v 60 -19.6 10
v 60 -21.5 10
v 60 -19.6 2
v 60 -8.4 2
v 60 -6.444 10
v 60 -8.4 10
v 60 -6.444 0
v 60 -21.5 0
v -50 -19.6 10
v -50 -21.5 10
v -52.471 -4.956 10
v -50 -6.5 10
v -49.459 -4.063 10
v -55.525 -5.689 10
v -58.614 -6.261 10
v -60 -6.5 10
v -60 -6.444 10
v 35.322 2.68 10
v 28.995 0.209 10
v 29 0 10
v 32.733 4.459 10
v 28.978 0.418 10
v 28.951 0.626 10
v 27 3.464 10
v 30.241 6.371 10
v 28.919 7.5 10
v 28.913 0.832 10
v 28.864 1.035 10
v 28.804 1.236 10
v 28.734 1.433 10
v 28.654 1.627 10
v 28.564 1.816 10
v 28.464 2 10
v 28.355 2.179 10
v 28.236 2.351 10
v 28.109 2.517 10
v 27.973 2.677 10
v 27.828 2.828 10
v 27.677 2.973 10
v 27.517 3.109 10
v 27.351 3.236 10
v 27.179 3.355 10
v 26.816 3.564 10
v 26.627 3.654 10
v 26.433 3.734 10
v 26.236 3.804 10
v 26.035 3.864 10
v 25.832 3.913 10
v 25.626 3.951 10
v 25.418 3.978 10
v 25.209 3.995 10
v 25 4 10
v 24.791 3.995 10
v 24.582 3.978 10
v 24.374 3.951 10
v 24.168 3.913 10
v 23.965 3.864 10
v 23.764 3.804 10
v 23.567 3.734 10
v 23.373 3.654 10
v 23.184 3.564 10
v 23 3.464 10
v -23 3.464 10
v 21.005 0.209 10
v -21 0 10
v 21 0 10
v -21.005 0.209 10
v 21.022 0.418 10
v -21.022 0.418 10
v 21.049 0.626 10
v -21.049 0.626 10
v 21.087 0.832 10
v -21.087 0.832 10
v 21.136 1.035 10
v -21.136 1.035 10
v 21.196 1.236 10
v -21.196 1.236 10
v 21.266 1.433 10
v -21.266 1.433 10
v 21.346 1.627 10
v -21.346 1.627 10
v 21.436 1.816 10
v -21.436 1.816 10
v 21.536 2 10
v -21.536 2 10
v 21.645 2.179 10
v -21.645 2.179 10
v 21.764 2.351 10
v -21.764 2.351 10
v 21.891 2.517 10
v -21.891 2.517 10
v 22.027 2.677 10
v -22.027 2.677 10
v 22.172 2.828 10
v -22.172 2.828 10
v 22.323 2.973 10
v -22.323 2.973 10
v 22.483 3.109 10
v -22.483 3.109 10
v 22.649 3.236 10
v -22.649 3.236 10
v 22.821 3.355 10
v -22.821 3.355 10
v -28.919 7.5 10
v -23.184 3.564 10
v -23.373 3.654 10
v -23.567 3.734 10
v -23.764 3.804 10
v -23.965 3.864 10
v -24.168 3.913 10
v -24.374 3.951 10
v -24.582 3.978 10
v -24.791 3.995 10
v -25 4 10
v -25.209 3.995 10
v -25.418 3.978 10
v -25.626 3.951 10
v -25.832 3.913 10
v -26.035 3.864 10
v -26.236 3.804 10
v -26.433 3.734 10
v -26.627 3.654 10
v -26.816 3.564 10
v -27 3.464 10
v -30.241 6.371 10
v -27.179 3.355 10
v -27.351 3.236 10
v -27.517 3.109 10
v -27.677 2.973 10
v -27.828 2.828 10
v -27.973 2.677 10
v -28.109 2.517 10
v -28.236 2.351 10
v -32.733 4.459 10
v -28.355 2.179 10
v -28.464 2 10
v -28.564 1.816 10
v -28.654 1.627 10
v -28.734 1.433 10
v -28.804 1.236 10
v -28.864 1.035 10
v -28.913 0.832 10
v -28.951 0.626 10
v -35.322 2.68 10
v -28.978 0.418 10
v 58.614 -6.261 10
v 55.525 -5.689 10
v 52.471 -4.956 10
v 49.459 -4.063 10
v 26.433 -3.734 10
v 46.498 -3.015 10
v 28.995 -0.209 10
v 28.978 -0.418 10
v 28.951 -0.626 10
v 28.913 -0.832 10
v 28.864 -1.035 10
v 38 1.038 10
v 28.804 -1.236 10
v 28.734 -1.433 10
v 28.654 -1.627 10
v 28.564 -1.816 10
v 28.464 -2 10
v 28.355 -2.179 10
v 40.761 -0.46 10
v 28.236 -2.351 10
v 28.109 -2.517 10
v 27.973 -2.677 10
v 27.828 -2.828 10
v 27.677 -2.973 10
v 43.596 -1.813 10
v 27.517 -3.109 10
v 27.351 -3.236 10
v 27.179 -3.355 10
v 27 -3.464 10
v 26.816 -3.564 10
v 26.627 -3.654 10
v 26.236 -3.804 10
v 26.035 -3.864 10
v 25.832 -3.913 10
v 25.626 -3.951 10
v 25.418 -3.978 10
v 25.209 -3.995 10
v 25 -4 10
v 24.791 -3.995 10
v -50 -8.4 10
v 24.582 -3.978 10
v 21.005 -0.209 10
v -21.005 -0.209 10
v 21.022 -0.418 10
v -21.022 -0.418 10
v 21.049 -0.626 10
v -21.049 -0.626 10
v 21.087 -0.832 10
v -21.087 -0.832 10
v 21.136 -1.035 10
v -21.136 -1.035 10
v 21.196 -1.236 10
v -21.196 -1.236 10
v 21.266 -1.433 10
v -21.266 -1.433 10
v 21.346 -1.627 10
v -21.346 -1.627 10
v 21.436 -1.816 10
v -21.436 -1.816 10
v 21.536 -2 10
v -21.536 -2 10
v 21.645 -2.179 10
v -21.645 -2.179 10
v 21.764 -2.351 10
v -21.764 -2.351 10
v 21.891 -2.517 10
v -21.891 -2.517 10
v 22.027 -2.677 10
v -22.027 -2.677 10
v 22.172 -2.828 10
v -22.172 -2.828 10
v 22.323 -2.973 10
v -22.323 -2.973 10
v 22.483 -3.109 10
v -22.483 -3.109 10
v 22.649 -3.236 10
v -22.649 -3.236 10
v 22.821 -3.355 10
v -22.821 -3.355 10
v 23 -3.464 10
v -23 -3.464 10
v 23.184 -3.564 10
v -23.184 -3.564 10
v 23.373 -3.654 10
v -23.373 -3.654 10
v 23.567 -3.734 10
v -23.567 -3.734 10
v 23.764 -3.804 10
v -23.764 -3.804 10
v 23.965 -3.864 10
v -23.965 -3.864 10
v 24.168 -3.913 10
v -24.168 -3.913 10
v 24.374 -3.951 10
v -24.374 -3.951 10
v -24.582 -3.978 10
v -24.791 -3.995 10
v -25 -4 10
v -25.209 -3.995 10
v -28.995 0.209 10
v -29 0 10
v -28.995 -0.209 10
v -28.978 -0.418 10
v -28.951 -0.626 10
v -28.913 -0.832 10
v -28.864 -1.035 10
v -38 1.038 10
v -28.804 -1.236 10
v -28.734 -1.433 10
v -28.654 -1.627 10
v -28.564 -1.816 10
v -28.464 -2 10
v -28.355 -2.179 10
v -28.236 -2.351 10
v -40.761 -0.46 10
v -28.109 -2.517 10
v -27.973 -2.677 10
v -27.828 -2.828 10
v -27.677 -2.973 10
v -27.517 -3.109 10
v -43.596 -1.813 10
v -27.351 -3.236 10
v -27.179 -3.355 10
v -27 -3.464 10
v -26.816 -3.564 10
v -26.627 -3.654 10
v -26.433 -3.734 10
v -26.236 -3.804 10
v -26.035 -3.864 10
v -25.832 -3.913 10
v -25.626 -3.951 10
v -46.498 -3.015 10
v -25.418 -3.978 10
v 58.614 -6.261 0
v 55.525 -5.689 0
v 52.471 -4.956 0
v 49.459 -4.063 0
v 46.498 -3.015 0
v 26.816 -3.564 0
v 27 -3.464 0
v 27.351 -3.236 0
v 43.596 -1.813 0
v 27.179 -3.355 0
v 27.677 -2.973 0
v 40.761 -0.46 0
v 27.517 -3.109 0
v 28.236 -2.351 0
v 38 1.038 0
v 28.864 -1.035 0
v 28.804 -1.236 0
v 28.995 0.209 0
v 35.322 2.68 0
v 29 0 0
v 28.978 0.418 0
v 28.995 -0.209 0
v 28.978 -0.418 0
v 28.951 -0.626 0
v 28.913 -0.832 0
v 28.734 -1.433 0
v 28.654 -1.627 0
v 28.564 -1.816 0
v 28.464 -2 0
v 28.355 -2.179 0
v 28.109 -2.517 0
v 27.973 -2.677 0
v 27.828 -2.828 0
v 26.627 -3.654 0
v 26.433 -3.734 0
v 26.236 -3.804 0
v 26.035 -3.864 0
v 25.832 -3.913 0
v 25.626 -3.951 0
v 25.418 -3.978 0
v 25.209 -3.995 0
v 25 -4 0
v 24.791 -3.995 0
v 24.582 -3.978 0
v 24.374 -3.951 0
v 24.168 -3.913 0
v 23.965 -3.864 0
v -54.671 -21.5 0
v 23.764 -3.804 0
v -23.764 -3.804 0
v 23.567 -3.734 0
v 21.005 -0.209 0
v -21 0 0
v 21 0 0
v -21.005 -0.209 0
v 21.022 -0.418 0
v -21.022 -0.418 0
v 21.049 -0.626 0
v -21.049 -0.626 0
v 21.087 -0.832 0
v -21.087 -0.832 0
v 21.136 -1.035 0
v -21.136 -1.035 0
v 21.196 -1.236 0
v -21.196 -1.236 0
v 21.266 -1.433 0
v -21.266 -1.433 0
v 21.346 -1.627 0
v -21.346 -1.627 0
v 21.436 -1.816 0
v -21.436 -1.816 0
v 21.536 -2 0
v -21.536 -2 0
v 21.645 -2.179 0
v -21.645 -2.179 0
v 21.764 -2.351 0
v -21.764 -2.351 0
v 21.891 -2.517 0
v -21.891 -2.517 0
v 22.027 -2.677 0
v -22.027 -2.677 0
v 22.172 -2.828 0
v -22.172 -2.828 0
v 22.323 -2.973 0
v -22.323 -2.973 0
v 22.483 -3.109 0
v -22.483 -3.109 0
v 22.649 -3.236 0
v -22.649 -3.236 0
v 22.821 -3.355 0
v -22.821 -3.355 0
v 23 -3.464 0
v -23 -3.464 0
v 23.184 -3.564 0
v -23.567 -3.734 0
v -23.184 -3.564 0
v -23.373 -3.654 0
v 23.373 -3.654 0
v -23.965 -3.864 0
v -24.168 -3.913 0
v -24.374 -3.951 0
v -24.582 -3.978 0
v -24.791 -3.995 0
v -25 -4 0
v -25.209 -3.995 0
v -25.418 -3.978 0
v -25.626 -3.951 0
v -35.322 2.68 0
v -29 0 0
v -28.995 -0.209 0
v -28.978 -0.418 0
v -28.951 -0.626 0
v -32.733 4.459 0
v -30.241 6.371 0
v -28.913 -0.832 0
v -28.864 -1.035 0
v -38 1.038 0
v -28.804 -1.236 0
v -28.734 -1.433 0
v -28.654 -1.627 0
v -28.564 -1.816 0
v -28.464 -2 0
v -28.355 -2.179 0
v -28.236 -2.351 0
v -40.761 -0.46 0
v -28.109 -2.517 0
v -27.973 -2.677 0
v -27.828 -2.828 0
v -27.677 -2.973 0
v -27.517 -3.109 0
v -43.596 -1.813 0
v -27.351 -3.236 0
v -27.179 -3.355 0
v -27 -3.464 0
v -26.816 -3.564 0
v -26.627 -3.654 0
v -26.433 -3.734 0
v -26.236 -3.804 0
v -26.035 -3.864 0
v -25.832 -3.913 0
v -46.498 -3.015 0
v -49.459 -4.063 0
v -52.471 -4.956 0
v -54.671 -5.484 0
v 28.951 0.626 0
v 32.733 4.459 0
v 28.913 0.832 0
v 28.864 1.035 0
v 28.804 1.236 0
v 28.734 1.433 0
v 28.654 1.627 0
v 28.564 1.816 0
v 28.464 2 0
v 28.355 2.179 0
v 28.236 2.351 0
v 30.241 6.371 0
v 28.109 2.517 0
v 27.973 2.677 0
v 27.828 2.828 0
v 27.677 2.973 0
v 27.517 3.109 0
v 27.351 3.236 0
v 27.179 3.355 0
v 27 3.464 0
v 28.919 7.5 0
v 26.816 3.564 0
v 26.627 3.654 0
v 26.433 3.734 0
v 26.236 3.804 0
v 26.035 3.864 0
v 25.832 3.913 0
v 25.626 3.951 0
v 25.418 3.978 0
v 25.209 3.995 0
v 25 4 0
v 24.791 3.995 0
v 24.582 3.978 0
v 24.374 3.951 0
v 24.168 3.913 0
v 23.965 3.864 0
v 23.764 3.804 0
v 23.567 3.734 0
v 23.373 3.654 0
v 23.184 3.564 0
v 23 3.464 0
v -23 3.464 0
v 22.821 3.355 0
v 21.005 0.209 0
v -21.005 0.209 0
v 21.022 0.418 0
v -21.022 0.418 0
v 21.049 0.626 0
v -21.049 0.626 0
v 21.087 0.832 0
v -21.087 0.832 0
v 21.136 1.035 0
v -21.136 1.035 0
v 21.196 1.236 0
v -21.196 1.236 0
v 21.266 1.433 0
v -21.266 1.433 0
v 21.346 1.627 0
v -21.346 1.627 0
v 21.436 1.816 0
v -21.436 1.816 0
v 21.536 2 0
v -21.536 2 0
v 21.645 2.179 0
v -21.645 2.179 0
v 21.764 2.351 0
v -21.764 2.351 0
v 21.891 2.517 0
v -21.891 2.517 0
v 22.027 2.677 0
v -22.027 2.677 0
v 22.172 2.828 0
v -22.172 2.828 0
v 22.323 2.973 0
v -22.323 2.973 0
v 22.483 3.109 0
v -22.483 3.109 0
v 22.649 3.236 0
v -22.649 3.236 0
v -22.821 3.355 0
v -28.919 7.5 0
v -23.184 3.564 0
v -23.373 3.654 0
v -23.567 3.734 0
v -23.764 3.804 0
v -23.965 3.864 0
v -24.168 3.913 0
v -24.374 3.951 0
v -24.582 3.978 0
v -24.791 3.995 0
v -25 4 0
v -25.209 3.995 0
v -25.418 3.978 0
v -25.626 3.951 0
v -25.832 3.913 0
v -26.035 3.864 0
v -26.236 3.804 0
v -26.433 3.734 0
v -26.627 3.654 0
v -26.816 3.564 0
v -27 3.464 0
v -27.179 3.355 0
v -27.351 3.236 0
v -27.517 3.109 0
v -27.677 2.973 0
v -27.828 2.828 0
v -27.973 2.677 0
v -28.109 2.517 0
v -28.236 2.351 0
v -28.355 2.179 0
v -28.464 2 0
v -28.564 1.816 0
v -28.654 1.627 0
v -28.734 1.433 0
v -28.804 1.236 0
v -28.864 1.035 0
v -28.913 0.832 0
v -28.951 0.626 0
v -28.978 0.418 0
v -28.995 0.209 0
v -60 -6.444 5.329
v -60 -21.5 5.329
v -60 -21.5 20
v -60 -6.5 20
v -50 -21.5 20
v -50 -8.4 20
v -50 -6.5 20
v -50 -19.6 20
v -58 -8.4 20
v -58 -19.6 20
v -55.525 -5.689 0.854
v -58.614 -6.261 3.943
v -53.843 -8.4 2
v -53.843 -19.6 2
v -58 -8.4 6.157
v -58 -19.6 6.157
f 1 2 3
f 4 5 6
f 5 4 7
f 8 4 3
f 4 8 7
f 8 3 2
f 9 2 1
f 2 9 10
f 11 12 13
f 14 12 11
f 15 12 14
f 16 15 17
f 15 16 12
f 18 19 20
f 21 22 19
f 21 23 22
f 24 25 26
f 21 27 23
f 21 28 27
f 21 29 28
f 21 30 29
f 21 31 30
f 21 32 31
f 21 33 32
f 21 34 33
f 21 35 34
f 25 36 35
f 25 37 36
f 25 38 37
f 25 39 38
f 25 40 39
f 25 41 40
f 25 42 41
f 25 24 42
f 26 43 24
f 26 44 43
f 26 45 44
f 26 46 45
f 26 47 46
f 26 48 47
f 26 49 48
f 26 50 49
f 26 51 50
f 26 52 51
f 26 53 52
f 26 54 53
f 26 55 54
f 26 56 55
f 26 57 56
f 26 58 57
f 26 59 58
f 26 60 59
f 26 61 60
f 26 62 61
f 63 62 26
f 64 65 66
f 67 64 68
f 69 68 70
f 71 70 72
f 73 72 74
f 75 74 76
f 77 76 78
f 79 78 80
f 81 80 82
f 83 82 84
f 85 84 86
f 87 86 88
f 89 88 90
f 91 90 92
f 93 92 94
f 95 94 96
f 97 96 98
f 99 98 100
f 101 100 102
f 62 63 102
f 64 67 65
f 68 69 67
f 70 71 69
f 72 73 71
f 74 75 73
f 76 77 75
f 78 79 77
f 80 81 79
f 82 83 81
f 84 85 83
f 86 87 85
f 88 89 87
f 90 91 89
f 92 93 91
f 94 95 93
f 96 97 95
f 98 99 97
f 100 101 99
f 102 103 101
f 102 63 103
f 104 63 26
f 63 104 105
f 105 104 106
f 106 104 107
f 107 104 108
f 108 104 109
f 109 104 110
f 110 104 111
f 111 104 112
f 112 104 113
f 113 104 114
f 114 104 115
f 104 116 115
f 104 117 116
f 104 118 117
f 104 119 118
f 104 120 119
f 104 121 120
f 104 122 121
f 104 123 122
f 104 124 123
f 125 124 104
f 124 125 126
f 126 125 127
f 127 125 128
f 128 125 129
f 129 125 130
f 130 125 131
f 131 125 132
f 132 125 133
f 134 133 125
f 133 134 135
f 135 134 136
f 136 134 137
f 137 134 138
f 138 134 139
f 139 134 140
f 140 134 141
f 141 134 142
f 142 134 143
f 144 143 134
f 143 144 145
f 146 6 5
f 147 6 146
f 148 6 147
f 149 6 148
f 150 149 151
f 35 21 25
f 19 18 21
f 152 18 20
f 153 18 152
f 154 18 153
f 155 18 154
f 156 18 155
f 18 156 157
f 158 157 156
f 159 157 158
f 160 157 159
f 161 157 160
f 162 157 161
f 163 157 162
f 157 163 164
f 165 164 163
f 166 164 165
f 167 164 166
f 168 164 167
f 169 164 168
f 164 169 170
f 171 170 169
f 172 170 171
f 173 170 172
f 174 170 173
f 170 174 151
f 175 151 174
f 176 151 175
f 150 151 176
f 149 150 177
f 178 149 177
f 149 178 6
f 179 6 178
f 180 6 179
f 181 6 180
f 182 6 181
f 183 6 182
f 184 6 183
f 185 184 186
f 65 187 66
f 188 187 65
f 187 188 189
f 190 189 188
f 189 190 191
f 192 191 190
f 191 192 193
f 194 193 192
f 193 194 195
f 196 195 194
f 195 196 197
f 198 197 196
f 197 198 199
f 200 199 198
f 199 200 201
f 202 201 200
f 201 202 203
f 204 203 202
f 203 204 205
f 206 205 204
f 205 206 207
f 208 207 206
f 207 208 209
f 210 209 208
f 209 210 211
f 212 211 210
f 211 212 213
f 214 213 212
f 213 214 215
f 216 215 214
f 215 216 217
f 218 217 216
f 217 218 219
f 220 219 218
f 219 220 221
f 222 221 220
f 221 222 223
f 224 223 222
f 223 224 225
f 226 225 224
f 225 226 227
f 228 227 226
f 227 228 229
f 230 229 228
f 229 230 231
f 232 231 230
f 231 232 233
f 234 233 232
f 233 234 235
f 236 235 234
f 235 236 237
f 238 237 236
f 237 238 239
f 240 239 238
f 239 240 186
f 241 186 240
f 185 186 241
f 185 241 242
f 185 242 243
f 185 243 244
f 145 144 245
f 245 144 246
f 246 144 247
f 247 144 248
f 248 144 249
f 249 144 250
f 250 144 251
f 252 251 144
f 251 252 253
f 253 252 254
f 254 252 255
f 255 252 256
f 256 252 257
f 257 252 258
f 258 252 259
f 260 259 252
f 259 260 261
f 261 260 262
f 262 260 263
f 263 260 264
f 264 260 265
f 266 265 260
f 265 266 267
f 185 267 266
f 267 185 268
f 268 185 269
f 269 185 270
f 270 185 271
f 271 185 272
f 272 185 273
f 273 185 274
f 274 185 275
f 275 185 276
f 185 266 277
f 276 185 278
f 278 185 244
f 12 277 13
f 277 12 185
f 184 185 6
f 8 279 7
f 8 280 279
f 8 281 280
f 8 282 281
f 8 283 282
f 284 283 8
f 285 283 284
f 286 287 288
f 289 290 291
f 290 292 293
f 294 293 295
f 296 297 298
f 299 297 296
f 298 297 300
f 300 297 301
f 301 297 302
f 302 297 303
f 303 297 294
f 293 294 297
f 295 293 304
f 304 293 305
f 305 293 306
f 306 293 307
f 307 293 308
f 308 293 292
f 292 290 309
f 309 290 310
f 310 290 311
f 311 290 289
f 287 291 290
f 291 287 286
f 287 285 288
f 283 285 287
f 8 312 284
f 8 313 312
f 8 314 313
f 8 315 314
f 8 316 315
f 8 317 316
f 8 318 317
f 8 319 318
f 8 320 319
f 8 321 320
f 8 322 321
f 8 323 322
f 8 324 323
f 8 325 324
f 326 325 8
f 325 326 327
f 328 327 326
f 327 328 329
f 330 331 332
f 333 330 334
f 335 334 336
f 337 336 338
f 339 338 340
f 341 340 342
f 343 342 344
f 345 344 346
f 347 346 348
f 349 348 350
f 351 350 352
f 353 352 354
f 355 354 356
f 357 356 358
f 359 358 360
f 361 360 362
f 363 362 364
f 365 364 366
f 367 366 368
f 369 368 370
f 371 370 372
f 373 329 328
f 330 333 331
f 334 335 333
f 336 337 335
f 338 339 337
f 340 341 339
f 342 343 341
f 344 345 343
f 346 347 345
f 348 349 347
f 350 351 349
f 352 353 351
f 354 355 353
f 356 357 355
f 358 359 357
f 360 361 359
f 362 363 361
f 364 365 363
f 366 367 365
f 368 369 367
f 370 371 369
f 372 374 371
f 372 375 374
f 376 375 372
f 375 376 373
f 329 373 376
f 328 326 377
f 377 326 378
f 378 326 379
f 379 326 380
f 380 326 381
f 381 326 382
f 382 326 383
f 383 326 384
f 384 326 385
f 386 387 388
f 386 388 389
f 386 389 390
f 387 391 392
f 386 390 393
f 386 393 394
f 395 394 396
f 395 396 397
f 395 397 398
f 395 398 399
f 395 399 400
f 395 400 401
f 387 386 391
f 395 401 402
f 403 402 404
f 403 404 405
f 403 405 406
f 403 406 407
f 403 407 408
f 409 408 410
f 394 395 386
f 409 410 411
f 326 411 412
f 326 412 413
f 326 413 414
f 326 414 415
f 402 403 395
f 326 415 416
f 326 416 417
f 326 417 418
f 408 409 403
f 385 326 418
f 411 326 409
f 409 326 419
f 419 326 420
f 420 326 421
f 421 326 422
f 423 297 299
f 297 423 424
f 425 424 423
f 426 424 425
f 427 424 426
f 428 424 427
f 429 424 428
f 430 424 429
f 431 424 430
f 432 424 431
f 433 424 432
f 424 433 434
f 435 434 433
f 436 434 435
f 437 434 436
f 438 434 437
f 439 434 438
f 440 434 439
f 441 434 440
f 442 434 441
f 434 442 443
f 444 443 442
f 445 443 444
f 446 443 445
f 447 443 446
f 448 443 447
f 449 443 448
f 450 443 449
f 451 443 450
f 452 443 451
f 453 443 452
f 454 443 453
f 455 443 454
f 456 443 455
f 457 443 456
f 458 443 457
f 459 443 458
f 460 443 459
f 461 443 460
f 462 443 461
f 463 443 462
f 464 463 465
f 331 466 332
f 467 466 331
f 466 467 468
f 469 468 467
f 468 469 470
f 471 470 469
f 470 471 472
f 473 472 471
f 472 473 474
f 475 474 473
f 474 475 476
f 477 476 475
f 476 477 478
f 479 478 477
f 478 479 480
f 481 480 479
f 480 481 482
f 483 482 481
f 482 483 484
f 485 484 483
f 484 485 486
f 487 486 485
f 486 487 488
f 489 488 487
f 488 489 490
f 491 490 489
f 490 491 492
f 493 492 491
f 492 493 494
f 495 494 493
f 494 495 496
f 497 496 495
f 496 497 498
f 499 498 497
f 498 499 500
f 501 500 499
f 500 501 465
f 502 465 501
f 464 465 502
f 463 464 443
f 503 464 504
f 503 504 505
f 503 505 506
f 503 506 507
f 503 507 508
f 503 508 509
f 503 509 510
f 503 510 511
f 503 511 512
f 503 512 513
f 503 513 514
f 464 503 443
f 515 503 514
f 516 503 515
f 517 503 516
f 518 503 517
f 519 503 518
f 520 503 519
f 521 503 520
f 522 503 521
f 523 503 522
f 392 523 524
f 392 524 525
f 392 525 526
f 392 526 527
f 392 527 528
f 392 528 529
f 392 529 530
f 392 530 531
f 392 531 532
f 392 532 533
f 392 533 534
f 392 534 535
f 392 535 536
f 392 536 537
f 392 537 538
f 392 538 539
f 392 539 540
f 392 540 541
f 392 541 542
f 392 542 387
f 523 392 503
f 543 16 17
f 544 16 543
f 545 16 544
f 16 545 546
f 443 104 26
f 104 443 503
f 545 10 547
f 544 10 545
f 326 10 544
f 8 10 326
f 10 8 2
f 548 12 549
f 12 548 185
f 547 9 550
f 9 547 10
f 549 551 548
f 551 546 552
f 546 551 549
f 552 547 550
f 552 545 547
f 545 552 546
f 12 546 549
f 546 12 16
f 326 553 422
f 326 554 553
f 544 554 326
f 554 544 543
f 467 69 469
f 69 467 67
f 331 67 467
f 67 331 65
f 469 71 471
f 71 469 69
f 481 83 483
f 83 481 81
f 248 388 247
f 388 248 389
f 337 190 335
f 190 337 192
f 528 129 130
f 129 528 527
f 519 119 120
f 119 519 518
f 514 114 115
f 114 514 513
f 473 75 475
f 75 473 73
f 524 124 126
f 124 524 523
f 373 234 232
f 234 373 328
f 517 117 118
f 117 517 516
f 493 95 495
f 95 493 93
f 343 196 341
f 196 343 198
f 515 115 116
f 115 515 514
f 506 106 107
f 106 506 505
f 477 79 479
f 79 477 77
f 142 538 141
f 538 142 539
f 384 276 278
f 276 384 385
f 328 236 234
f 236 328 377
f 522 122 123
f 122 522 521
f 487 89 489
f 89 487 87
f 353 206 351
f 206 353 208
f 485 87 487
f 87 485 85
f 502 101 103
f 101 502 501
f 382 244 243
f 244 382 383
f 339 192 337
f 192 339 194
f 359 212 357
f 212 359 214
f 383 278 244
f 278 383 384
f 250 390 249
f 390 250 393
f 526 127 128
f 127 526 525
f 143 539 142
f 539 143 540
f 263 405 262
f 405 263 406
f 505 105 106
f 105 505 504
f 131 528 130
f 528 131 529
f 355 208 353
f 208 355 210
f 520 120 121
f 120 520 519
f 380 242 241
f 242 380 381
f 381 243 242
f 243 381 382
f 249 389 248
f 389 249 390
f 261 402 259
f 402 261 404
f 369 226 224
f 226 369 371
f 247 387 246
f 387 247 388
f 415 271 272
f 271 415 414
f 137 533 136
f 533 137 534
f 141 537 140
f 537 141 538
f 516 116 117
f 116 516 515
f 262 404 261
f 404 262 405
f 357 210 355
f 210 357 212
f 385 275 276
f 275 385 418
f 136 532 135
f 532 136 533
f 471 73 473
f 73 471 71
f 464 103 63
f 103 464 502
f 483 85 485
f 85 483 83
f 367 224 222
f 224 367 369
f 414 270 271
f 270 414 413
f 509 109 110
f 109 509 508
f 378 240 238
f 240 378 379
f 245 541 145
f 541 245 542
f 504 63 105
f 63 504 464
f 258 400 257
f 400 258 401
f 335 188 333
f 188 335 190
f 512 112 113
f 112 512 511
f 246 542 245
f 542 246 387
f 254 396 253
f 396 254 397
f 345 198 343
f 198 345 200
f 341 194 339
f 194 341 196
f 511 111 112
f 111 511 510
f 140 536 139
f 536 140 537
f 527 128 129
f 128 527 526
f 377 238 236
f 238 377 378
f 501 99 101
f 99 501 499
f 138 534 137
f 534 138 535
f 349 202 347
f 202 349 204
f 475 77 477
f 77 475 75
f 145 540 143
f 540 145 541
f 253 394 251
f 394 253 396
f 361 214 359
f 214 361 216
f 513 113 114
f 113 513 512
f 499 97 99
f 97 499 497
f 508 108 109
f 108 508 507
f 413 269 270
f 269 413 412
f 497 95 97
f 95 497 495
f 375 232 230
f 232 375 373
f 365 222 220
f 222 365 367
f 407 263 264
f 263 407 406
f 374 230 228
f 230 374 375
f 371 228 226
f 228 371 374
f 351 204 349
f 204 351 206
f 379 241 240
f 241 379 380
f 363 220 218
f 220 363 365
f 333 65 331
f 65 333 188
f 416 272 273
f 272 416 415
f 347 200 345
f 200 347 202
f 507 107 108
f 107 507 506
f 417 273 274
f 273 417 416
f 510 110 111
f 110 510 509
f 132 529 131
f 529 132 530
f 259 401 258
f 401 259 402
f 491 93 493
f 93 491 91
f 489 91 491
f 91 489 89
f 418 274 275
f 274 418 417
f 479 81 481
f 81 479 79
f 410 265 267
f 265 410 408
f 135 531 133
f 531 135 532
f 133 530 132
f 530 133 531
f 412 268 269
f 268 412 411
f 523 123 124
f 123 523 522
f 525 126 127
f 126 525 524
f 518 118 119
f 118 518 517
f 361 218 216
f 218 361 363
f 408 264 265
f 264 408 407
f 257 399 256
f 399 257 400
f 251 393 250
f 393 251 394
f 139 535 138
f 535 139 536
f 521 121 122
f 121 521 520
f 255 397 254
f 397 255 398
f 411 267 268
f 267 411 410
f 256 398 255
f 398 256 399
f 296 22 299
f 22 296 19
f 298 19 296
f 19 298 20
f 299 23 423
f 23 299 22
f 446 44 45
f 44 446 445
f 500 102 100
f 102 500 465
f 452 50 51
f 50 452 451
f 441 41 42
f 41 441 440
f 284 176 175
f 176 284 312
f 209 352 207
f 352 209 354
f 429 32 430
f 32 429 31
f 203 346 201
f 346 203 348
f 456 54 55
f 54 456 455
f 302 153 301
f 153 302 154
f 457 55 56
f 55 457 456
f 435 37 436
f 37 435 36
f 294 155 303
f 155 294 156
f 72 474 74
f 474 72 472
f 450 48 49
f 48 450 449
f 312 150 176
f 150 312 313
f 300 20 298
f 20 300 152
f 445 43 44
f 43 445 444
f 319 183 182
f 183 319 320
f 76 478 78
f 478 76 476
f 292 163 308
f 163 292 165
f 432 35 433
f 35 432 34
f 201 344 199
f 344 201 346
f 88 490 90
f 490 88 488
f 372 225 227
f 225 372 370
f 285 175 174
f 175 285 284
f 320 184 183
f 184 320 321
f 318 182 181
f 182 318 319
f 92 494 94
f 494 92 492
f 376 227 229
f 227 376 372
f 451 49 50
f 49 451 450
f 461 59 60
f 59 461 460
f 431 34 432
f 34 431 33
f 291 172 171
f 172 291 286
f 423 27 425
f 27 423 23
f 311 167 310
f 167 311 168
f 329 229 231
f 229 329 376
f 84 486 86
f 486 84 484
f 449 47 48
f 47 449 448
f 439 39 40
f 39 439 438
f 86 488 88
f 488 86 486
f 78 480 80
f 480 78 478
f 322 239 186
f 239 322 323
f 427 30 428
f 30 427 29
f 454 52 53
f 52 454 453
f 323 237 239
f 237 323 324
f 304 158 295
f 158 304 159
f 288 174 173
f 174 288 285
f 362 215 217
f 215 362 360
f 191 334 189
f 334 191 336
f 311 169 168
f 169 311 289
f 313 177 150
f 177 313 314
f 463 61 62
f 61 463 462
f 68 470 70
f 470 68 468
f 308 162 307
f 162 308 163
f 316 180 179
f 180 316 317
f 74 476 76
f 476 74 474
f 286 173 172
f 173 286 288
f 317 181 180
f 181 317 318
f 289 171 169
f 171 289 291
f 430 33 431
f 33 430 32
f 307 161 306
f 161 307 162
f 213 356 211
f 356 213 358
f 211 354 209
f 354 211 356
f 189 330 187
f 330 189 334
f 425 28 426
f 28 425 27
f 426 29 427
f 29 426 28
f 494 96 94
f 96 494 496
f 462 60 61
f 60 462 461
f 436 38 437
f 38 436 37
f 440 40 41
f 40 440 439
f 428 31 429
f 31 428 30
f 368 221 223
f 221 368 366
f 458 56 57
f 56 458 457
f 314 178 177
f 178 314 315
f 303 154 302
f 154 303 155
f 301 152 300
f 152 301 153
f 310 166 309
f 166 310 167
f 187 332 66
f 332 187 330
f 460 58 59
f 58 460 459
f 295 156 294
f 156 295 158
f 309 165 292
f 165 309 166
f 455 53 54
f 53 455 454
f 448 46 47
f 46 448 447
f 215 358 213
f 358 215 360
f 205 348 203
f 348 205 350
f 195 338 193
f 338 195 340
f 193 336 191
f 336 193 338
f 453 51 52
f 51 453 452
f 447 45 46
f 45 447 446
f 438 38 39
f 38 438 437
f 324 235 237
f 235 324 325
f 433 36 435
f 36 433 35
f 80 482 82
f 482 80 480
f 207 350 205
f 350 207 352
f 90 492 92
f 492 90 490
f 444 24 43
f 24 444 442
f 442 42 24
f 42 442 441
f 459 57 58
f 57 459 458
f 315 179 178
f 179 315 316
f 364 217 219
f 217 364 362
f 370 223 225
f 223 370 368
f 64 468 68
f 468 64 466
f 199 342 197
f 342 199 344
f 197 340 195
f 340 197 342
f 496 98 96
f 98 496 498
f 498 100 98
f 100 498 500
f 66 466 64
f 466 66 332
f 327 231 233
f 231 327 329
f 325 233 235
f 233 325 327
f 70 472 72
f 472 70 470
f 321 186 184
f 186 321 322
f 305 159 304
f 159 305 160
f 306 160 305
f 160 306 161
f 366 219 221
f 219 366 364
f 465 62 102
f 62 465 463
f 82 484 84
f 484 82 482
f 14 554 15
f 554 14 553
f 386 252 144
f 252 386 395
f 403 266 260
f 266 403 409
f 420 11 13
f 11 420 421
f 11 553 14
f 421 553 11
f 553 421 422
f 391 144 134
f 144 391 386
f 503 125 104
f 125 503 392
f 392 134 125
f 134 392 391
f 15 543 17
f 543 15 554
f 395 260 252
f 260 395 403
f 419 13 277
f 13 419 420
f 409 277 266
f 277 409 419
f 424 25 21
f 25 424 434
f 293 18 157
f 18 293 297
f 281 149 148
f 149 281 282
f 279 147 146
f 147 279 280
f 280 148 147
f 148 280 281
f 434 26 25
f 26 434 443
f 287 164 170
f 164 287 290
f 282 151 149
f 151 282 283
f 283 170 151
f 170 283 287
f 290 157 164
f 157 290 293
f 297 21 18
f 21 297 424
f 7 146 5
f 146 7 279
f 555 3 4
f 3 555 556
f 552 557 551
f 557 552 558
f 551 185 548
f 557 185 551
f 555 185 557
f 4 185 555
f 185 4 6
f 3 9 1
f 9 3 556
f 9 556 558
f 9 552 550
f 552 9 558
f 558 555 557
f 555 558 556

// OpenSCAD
$fa=3;
$fs=0.2;

FFF=[false,false,false];FFT=[false,false,true];
FTF=[false,true,false];FTT=[false,true,true];
TFF=[true,false,false];TFT=[true,false,true];
TTF=[true,true,false];TTT=[true,true,true];
module cube2(size, center) {
  translate([
    center[0] ? -size[0]/2 : 0,
    center[1] ? -size[1]/2 : 0,
    center[2] ? -size[2]/2 : 0]) cube(size);
}

module bracket_with_screws() {
  difference() {
    offset=10;
    rotate([3.2,0,0]) translate([0,10,-2]) {
      /*
      for(a=[-2:2]) translate([a*10,0,6]) {
        translate([0,0,6]) cube2([5,8,4],TFF);
        cube2([5,5,10],TFF);
      }
      */
      difference() {
        union() {
          translate([0,0,offset+6]) cube2([46.5,8,4],TFF);
          translate([0,0,offset]) cube2([46.5,5,10],TFF);
          translate([0,0,offset+10])rotate([-15,0,0])mirror([0,0,1])cube2([46.5,5,10],TFF);
        }
        for(a=[0:3]) translate([a*10-46.5/2+5,0,offset]) cube2([5,100,100],FTT);
          
      }
      difference() {
        cube2([55,20,3+offset],TTF); 
        translate([0,0,800+offset+1.8])rotate([90,0,0])cylinder(r=800,h=100,center=true,$fn=360);
      }
    }
    mirror([0,0,1])cube2([100,100,100],TTF);
    for(a=[-1,1])translate([a*20,6,0]) {
      cylinder(d=3.2,h=100,center=true);
      translate([0,0,3]) cylinder(d=4.9,h=100);
    }
  }
}

module bracket_for_rods() {
  module teeth(mode) {
    rotate([3.2,0,0]){
      if (mode=="teeth") {
        difference() {
          union() {
            translate([0,0,6]) cube2([46.5,8,4],TFF);
            translate([0,0,0]) cube2([46.5,5,10],TFF);
            translate([0,0,10])rotate([-15,0,0])mirror([0,0,1])cube2([46.5,5,10],TFF);
          }
          for(a=[0:3]) translate([a*10-46.5/2+5,0,0]) cube2([5,100,100],FTT);
        }
      } else if (mode=="curvature") {
        translate([0,0,800+1.8])rotate([90,0,0])cylinder(r=800,h=100,center=true,$fn=360);
      }
    }
  }
  difference() {
    union() {
      offset=20;
      translate([0,0,offset]) teeth("teeth");
      difference() {
        translate([0,3,0]) intersection() {
          cube2([65,15,30],TTF); 
          translate([0,0,42.5])rotate([0,45,0])cube2([100,100,100],TTT);
        }
        translate([0,0,offset]) teeth("curvature");
      }
    }
    for(a=[-1,1])translate([a*25,0,7.5]) rotate([90,0,0]){
      cylinder(d=8,h=100,center=true);
    }
  }
}

module tablet_bracket() {
  difference() {
    intersection() {
      union() {
        translate([0,-7,0]) cube2([120,29,10],TTF);
        translate([-60,-14,0]) cube2([10,15,20],FTF);
      }
      translate([-58+100,-14,2+100]) translate([87-2*1.4142,0])rotate([0,45,0])cube2([400,200,400], TTT);
    }
    for(a=[-1,1])translate([a*25,0,0]){
      cylinder(d=8,h=100,center=true);
    }
    for(a=[-1,1])translate([a*68,100-47,0]) cylinder(r=60,h=100,center=true);
    translate([-58+100,-14,2+100]) intersection() {
      cube2([200,11.2,200],TTT);
      translate([87,0])rotate([0,45,0])cube2([400,20,400], TTT);
    }
  }
}
//bracket_for_rods();
//bracket_with_screws();
tablet_bracket();
